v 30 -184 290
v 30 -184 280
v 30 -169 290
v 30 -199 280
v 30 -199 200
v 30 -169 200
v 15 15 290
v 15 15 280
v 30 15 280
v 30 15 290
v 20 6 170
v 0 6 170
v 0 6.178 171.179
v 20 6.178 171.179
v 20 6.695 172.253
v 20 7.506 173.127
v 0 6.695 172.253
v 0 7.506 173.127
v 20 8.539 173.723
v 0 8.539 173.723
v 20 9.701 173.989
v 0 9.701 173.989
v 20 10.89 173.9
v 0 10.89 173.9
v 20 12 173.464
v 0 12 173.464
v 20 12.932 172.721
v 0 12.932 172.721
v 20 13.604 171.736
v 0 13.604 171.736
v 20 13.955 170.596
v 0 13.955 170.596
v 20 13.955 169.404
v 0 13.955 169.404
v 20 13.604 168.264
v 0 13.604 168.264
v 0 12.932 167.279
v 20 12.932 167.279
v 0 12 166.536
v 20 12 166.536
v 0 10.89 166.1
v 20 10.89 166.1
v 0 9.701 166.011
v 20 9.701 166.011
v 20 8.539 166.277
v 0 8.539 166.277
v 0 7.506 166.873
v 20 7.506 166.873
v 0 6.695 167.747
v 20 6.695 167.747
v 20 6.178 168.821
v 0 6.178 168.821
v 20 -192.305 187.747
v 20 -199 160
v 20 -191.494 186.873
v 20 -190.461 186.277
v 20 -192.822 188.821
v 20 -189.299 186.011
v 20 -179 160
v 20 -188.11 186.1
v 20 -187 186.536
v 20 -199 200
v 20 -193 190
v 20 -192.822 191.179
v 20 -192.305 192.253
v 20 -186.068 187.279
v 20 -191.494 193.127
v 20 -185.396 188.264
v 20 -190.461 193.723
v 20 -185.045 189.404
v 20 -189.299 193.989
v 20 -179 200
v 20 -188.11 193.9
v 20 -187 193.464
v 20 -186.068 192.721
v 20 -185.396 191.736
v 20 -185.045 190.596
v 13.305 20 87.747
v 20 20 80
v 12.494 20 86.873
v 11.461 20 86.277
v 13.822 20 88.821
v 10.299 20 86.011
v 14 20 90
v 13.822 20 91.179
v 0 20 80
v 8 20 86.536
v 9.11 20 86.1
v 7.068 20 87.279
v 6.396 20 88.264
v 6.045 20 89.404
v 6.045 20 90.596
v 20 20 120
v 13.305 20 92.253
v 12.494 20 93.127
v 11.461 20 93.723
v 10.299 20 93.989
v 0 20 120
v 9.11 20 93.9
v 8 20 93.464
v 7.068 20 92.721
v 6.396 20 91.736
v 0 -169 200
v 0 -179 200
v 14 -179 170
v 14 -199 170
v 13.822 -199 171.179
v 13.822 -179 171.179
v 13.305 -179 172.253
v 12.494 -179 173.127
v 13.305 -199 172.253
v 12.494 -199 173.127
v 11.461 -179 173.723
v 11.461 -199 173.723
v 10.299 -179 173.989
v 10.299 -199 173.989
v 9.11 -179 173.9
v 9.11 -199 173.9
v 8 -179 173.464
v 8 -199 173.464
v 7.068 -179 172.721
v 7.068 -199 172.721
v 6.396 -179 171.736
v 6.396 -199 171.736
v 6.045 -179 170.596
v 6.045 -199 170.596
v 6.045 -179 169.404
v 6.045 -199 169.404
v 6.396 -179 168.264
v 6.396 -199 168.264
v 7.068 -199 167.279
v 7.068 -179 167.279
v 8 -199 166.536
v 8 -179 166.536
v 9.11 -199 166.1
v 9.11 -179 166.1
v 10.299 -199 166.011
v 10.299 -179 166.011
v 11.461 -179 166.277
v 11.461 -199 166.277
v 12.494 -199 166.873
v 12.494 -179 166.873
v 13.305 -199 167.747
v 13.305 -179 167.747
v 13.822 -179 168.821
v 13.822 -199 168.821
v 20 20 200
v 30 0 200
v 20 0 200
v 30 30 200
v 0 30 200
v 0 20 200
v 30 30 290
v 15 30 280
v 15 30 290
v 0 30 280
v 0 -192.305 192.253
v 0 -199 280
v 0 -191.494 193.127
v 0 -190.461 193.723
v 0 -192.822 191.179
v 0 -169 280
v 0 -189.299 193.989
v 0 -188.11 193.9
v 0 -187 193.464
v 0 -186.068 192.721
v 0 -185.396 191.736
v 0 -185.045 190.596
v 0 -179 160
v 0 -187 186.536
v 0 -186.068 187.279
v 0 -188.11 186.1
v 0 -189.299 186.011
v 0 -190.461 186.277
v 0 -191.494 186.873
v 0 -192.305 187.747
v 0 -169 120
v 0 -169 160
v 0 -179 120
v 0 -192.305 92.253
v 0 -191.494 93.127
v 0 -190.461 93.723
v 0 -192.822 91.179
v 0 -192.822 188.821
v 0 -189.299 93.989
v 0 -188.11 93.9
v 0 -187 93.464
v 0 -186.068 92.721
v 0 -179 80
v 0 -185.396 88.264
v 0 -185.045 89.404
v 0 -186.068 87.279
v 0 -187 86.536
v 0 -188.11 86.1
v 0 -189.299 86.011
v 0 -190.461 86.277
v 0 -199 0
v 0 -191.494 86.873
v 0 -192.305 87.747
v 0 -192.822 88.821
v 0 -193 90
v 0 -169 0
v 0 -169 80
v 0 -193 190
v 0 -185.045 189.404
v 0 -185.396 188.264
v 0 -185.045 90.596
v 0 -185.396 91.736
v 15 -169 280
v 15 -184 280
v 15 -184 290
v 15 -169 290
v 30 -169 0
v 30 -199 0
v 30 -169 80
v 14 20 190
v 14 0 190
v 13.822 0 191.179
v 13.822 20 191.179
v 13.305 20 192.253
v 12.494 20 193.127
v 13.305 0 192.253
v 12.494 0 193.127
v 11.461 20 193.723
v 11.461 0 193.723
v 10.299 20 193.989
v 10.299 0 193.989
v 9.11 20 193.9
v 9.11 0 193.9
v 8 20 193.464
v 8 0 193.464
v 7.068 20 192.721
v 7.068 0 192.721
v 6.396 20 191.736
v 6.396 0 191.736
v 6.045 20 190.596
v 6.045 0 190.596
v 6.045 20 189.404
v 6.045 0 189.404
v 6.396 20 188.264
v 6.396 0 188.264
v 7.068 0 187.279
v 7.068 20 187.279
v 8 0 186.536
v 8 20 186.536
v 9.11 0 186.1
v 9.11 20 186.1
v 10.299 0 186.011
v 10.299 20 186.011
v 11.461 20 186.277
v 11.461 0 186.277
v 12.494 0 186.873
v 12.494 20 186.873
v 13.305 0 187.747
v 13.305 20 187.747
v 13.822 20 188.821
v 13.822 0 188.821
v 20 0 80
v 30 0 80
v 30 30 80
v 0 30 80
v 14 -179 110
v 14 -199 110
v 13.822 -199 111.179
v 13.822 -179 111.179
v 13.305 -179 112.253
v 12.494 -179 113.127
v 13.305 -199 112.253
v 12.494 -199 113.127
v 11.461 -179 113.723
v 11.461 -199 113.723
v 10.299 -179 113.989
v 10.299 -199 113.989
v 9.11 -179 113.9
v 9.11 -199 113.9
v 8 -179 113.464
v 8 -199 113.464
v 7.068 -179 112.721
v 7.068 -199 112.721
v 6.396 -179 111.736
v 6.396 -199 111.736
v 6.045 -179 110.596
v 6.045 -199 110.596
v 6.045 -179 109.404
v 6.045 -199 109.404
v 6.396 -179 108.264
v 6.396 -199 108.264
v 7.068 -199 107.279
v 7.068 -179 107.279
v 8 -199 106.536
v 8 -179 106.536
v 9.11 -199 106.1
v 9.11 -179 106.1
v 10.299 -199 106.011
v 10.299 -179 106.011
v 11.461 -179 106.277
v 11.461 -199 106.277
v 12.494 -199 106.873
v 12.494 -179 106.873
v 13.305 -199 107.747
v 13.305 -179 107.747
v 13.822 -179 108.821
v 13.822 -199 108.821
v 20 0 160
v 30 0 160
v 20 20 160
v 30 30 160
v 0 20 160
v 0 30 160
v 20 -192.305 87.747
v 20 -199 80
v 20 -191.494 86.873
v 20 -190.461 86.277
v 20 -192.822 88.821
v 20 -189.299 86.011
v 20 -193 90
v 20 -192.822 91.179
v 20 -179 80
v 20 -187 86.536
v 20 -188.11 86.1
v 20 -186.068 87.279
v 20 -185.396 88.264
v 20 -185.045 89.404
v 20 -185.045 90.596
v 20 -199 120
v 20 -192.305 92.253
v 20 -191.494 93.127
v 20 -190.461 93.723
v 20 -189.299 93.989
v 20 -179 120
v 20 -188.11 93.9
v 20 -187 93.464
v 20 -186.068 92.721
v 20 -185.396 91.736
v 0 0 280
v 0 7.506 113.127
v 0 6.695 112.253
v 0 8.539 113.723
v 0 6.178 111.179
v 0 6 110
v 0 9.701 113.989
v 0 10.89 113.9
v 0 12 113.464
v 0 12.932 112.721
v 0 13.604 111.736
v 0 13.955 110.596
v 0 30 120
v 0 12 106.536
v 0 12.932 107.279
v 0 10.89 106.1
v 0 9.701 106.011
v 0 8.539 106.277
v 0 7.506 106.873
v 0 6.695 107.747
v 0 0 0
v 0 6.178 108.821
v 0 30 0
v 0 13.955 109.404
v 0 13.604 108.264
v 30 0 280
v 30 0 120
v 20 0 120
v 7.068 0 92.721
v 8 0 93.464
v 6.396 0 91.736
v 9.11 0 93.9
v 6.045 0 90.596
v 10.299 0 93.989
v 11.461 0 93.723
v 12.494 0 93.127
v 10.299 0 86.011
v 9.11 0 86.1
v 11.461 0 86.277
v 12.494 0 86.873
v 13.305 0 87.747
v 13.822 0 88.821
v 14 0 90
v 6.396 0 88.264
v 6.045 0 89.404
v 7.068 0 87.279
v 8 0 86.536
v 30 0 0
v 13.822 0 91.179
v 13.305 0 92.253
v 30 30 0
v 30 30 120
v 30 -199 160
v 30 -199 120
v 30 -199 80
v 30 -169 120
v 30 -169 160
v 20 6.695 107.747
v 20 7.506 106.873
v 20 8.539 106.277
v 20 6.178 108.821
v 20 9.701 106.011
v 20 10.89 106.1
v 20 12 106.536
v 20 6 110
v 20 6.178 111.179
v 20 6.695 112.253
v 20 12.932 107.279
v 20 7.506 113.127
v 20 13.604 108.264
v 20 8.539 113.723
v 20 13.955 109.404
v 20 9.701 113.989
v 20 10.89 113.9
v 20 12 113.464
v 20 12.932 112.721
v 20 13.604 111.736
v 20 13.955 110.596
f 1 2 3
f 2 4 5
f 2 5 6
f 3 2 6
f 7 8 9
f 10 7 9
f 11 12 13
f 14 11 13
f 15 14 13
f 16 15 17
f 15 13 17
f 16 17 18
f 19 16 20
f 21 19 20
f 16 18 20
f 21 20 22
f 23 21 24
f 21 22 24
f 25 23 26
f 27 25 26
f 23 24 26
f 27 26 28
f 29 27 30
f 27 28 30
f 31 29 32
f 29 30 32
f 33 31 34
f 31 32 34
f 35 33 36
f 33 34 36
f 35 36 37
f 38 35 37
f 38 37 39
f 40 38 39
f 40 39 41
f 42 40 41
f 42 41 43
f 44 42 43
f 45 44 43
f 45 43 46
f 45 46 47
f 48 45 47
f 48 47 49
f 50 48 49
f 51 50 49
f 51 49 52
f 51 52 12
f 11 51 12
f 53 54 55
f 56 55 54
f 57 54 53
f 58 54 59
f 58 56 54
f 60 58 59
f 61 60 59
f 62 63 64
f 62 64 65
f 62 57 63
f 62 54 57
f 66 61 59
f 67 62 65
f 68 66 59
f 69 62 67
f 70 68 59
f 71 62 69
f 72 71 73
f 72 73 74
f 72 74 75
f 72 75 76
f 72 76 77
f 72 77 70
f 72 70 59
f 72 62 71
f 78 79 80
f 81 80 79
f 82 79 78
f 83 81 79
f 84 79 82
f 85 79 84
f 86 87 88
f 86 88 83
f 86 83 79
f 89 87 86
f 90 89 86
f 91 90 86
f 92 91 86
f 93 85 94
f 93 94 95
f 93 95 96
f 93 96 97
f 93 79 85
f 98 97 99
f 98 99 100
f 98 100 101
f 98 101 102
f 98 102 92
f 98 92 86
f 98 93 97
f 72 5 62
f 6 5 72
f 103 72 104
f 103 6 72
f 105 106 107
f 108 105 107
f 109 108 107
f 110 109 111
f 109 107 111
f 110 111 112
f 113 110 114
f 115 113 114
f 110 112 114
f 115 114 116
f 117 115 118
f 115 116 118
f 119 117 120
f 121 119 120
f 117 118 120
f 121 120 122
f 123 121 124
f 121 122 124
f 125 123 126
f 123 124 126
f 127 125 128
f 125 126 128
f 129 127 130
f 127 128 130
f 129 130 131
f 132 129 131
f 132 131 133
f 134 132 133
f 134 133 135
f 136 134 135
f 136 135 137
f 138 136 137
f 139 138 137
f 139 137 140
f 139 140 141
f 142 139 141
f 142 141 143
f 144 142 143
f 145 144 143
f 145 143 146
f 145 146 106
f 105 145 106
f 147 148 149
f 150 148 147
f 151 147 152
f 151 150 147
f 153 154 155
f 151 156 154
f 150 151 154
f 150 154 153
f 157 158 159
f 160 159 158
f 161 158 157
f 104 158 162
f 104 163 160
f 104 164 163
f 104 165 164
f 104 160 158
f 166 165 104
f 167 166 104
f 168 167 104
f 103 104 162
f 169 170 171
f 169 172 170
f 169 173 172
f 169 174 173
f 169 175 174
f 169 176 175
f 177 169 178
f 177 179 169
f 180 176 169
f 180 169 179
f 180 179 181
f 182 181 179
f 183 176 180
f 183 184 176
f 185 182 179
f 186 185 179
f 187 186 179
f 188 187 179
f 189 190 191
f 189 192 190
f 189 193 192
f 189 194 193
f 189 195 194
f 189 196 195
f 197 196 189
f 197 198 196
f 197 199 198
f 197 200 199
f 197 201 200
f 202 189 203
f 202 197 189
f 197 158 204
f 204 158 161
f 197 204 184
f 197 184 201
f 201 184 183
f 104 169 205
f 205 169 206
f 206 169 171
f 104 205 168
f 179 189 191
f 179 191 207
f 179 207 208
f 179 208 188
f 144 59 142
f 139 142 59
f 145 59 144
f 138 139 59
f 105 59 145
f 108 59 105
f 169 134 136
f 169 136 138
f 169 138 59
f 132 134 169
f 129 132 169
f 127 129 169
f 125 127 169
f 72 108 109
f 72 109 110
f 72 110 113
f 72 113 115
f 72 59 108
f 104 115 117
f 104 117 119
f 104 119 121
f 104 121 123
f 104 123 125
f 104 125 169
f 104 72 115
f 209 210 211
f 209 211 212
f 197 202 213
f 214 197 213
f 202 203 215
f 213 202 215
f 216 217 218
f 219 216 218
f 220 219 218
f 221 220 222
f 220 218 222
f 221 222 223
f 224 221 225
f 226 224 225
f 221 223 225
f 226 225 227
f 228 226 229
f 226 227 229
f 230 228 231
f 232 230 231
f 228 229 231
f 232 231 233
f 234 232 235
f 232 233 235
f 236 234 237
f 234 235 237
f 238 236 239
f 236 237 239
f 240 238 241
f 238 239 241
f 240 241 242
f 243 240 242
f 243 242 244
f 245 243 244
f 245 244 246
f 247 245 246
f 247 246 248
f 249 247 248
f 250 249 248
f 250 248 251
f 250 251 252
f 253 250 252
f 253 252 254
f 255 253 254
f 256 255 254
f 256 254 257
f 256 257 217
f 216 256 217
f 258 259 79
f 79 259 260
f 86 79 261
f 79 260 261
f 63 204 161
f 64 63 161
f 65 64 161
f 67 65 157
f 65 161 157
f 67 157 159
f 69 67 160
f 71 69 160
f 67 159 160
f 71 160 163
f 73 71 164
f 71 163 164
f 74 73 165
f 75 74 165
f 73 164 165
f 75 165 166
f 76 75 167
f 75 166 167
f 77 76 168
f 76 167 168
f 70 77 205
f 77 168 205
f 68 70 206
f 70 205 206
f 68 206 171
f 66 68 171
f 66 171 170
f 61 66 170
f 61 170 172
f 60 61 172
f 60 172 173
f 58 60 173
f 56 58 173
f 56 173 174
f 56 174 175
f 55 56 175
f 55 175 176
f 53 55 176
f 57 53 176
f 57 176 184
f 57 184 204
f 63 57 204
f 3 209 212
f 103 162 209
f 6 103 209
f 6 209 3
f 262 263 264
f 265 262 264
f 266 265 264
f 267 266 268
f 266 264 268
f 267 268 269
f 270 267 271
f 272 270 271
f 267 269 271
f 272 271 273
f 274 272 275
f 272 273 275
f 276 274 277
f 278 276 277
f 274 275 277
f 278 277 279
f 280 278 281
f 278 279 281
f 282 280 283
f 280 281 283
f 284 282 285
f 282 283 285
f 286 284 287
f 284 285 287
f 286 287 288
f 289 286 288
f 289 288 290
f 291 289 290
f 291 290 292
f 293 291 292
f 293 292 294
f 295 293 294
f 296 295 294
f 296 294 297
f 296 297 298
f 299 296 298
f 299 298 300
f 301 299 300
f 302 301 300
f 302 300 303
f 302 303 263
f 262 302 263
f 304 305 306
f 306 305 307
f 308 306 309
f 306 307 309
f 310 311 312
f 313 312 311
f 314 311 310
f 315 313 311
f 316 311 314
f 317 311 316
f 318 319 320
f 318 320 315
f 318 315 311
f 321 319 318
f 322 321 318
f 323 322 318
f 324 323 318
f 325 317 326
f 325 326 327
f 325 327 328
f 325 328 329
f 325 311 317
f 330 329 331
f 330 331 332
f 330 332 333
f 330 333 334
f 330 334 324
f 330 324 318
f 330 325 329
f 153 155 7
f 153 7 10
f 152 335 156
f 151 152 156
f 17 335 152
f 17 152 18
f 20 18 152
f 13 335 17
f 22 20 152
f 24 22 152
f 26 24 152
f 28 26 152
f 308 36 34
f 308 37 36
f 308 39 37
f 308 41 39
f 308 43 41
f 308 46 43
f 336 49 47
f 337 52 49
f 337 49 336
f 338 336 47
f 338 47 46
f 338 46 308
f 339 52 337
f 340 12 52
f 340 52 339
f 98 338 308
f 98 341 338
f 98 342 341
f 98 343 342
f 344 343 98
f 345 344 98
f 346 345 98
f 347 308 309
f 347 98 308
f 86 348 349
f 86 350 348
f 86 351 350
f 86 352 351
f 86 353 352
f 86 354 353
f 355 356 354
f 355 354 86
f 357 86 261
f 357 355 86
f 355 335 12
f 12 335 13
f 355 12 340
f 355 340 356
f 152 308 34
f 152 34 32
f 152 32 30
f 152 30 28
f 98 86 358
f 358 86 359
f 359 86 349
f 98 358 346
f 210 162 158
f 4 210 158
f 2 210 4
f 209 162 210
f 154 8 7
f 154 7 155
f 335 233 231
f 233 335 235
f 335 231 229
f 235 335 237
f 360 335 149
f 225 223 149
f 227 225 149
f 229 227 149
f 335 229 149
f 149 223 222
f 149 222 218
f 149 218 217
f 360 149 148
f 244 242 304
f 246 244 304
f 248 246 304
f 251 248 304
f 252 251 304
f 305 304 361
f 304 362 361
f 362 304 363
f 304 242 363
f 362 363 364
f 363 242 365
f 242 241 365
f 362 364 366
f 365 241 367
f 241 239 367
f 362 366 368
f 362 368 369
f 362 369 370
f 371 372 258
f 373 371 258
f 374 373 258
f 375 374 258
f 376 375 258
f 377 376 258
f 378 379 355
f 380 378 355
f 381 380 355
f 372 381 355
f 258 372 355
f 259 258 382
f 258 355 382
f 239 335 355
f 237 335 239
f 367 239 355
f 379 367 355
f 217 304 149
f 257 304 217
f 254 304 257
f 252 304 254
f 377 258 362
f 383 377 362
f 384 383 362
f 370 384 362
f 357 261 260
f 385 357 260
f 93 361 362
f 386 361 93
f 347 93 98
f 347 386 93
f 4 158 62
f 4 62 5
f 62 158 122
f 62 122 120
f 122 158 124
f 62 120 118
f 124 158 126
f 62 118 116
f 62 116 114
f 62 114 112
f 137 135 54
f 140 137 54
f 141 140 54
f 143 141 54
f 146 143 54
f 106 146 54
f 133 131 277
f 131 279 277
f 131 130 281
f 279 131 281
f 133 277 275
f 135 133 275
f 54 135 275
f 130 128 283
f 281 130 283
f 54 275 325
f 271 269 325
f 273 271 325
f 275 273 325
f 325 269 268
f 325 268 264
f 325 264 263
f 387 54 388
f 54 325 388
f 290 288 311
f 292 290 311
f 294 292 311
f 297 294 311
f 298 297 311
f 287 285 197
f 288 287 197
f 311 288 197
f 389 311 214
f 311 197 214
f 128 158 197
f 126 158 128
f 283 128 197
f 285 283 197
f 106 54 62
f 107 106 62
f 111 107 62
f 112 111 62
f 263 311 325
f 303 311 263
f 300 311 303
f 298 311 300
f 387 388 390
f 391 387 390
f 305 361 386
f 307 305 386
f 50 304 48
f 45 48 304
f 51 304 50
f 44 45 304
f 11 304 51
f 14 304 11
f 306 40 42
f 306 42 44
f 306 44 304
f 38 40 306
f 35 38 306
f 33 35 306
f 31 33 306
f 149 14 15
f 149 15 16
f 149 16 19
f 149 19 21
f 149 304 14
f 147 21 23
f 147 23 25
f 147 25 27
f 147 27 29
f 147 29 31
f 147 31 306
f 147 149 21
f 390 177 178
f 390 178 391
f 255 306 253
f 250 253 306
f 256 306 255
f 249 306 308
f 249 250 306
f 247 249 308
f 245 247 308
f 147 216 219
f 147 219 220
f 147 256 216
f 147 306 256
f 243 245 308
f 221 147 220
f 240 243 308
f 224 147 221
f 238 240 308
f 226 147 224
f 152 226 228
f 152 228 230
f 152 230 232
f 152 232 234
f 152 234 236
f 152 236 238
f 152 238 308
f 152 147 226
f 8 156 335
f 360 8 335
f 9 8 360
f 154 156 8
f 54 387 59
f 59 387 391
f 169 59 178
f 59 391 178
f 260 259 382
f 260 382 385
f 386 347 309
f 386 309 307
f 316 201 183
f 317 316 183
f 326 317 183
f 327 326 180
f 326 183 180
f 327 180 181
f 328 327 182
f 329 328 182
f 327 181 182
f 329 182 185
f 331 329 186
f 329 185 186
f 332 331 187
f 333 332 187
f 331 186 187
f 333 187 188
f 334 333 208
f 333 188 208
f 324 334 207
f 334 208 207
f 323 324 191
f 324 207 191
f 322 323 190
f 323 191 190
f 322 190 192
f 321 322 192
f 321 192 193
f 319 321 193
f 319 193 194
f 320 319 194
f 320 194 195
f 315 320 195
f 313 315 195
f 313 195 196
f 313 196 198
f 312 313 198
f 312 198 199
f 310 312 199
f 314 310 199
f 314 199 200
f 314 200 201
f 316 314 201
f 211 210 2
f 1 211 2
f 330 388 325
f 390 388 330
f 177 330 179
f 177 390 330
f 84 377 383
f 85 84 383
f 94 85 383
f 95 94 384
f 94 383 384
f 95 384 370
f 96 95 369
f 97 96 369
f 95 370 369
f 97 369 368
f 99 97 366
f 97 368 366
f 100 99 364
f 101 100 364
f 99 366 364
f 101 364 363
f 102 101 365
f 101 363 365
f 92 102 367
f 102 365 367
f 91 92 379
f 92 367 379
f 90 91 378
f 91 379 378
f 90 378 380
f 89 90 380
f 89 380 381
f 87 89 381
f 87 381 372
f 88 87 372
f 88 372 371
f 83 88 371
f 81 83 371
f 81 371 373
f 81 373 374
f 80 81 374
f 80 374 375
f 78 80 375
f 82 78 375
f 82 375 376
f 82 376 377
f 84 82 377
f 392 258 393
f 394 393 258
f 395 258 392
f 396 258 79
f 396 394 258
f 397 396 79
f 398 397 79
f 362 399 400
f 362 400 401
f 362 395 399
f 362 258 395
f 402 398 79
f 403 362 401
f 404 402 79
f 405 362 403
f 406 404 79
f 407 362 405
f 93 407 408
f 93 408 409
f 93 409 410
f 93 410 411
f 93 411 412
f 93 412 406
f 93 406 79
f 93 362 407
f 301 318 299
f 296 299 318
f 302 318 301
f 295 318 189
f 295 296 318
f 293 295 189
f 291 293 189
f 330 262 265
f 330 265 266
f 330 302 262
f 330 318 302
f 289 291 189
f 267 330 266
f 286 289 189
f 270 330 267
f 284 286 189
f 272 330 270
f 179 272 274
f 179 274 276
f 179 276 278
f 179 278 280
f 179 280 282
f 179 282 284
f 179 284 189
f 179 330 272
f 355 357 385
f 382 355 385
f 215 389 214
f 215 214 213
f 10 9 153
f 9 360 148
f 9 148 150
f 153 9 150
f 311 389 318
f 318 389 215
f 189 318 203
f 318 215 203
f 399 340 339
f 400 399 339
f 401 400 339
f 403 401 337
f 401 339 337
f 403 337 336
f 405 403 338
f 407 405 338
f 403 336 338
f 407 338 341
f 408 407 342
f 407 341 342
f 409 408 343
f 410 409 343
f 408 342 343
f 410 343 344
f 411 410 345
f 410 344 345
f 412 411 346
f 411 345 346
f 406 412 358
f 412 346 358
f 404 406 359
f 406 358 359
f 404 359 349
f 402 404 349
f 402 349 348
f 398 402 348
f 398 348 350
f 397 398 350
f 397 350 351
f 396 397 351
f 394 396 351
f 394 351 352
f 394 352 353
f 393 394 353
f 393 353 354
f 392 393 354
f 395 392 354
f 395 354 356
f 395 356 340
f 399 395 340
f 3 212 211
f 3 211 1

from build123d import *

# Parameters (mm, degrees)
F0_W      = 30
F0_H      = 30
F1_DEPTH  = 280
F2_W      = 15
F2_H      = 15
F3_DEPTH  = 10
F4_W      = 30
F4_H      = 40
F5_DEPTH  = 10
F6_W      = 20
F6_H      = 40
F7_DEPTH  = 10
F9_R      = 4
F10_DEPTH = 30.001
F11_R     = 4
F12_DEPTH = 30.001
F13_R     = 4
F14_DEPTH = 25
F15_R     = 4
F16_DEPTH = 25


with BuildPart() as f1:
    # F0 (on Top) → F1 (new body)
    with BuildSketch(Plane.XY):
        with Locations((15, 15)):
            Rectangle(F0_W, F0_H)
    extrude(amount=F1_DEPTH)

    # F2 (on face) → F3 (join)
    with BuildSketch(Plane.XY.offset(280)):
        with Locations((22.5, 22.5)):
            Rectangle(F2_W, F2_H)
    extrude(amount=F3_DEPTH)

    # F4 (on face) → F5 (cut)
    with BuildSketch(Plane(origin=(0, 30, 0), x_dir=(-1, 0, 0), z_dir=(0, 1, 0))):
        with Locations((-15, 180)):
            Rectangle(F4_W, F4_H)
        with Locations((-15, 100)):
            Rectangle(F4_W, F4_H)
    extrude(amount=-F5_DEPTH, mode=Mode.SUBTRACT)

    # F6 (on face) → F7 (cut)
    with BuildSketch(Plane.YZ.offset(30)):
        with Locations((10, 180)):
            Rectangle(F6_W, F6_H)
        with Locations((10, 100)):
            Rectangle(F6_W, F6_H)
    extrude(amount=-F7_DEPTH, mode=Mode.SUBTRACT)


with BuildPart() as f8_1:
    # F8: copy of F1
    add(f1.part.moved(Location((0, -199, 0))))

    # F13 (on face) → F14 (cut)
    with BuildSketch(Plane.XZ.offset(199)):
        with Locations((10, 170)):
            Circle(F13_R)
        with Locations((10, 110)):
            Circle(F13_R)
    extrude(amount=-F14_DEPTH, mode=Mode.SUBTRACT)

    # F15 (on face) → F16 (cut)
    with BuildSketch(Plane(origin=(0, 0, 0), x_dir=(0, -1, 0), z_dir=(-1, 0, 0))):
        with Locations((189, 190)):
            Circle(F15_R)
        with Locations((189, 90)):
            Circle(F15_R)
    extrude(amount=-F16_DEPTH, mode=Mode.SUBTRACT)


with BuildPart() as f1_1:
    add(f1.part)

    # F9 (on face) → F10 (cut, through all)
    with BuildSketch(Plane.XZ):
        with Locations((10, 190)):
            Circle(F9_R)
        with Locations((10, 90)):
            Circle(F9_R)
    extrude(amount=-F10_DEPTH, mode=Mode.SUBTRACT)

    # F11 (on face) → F12 (cut, through all)
    with BuildSketch(Plane(origin=(0, 0, 0), x_dir=(0, -1, 0), z_dir=(-1, 0, 0))):
        with Locations((-10, 110)):
            Circle(F11_R)
        with Locations((-10, 170)):
            Circle(F11_R)
    extrude(amount=-F12_DEPTH, mode=Mode.SUBTRACT)


solid = Compound([f8_1.part, f1_1.part])
